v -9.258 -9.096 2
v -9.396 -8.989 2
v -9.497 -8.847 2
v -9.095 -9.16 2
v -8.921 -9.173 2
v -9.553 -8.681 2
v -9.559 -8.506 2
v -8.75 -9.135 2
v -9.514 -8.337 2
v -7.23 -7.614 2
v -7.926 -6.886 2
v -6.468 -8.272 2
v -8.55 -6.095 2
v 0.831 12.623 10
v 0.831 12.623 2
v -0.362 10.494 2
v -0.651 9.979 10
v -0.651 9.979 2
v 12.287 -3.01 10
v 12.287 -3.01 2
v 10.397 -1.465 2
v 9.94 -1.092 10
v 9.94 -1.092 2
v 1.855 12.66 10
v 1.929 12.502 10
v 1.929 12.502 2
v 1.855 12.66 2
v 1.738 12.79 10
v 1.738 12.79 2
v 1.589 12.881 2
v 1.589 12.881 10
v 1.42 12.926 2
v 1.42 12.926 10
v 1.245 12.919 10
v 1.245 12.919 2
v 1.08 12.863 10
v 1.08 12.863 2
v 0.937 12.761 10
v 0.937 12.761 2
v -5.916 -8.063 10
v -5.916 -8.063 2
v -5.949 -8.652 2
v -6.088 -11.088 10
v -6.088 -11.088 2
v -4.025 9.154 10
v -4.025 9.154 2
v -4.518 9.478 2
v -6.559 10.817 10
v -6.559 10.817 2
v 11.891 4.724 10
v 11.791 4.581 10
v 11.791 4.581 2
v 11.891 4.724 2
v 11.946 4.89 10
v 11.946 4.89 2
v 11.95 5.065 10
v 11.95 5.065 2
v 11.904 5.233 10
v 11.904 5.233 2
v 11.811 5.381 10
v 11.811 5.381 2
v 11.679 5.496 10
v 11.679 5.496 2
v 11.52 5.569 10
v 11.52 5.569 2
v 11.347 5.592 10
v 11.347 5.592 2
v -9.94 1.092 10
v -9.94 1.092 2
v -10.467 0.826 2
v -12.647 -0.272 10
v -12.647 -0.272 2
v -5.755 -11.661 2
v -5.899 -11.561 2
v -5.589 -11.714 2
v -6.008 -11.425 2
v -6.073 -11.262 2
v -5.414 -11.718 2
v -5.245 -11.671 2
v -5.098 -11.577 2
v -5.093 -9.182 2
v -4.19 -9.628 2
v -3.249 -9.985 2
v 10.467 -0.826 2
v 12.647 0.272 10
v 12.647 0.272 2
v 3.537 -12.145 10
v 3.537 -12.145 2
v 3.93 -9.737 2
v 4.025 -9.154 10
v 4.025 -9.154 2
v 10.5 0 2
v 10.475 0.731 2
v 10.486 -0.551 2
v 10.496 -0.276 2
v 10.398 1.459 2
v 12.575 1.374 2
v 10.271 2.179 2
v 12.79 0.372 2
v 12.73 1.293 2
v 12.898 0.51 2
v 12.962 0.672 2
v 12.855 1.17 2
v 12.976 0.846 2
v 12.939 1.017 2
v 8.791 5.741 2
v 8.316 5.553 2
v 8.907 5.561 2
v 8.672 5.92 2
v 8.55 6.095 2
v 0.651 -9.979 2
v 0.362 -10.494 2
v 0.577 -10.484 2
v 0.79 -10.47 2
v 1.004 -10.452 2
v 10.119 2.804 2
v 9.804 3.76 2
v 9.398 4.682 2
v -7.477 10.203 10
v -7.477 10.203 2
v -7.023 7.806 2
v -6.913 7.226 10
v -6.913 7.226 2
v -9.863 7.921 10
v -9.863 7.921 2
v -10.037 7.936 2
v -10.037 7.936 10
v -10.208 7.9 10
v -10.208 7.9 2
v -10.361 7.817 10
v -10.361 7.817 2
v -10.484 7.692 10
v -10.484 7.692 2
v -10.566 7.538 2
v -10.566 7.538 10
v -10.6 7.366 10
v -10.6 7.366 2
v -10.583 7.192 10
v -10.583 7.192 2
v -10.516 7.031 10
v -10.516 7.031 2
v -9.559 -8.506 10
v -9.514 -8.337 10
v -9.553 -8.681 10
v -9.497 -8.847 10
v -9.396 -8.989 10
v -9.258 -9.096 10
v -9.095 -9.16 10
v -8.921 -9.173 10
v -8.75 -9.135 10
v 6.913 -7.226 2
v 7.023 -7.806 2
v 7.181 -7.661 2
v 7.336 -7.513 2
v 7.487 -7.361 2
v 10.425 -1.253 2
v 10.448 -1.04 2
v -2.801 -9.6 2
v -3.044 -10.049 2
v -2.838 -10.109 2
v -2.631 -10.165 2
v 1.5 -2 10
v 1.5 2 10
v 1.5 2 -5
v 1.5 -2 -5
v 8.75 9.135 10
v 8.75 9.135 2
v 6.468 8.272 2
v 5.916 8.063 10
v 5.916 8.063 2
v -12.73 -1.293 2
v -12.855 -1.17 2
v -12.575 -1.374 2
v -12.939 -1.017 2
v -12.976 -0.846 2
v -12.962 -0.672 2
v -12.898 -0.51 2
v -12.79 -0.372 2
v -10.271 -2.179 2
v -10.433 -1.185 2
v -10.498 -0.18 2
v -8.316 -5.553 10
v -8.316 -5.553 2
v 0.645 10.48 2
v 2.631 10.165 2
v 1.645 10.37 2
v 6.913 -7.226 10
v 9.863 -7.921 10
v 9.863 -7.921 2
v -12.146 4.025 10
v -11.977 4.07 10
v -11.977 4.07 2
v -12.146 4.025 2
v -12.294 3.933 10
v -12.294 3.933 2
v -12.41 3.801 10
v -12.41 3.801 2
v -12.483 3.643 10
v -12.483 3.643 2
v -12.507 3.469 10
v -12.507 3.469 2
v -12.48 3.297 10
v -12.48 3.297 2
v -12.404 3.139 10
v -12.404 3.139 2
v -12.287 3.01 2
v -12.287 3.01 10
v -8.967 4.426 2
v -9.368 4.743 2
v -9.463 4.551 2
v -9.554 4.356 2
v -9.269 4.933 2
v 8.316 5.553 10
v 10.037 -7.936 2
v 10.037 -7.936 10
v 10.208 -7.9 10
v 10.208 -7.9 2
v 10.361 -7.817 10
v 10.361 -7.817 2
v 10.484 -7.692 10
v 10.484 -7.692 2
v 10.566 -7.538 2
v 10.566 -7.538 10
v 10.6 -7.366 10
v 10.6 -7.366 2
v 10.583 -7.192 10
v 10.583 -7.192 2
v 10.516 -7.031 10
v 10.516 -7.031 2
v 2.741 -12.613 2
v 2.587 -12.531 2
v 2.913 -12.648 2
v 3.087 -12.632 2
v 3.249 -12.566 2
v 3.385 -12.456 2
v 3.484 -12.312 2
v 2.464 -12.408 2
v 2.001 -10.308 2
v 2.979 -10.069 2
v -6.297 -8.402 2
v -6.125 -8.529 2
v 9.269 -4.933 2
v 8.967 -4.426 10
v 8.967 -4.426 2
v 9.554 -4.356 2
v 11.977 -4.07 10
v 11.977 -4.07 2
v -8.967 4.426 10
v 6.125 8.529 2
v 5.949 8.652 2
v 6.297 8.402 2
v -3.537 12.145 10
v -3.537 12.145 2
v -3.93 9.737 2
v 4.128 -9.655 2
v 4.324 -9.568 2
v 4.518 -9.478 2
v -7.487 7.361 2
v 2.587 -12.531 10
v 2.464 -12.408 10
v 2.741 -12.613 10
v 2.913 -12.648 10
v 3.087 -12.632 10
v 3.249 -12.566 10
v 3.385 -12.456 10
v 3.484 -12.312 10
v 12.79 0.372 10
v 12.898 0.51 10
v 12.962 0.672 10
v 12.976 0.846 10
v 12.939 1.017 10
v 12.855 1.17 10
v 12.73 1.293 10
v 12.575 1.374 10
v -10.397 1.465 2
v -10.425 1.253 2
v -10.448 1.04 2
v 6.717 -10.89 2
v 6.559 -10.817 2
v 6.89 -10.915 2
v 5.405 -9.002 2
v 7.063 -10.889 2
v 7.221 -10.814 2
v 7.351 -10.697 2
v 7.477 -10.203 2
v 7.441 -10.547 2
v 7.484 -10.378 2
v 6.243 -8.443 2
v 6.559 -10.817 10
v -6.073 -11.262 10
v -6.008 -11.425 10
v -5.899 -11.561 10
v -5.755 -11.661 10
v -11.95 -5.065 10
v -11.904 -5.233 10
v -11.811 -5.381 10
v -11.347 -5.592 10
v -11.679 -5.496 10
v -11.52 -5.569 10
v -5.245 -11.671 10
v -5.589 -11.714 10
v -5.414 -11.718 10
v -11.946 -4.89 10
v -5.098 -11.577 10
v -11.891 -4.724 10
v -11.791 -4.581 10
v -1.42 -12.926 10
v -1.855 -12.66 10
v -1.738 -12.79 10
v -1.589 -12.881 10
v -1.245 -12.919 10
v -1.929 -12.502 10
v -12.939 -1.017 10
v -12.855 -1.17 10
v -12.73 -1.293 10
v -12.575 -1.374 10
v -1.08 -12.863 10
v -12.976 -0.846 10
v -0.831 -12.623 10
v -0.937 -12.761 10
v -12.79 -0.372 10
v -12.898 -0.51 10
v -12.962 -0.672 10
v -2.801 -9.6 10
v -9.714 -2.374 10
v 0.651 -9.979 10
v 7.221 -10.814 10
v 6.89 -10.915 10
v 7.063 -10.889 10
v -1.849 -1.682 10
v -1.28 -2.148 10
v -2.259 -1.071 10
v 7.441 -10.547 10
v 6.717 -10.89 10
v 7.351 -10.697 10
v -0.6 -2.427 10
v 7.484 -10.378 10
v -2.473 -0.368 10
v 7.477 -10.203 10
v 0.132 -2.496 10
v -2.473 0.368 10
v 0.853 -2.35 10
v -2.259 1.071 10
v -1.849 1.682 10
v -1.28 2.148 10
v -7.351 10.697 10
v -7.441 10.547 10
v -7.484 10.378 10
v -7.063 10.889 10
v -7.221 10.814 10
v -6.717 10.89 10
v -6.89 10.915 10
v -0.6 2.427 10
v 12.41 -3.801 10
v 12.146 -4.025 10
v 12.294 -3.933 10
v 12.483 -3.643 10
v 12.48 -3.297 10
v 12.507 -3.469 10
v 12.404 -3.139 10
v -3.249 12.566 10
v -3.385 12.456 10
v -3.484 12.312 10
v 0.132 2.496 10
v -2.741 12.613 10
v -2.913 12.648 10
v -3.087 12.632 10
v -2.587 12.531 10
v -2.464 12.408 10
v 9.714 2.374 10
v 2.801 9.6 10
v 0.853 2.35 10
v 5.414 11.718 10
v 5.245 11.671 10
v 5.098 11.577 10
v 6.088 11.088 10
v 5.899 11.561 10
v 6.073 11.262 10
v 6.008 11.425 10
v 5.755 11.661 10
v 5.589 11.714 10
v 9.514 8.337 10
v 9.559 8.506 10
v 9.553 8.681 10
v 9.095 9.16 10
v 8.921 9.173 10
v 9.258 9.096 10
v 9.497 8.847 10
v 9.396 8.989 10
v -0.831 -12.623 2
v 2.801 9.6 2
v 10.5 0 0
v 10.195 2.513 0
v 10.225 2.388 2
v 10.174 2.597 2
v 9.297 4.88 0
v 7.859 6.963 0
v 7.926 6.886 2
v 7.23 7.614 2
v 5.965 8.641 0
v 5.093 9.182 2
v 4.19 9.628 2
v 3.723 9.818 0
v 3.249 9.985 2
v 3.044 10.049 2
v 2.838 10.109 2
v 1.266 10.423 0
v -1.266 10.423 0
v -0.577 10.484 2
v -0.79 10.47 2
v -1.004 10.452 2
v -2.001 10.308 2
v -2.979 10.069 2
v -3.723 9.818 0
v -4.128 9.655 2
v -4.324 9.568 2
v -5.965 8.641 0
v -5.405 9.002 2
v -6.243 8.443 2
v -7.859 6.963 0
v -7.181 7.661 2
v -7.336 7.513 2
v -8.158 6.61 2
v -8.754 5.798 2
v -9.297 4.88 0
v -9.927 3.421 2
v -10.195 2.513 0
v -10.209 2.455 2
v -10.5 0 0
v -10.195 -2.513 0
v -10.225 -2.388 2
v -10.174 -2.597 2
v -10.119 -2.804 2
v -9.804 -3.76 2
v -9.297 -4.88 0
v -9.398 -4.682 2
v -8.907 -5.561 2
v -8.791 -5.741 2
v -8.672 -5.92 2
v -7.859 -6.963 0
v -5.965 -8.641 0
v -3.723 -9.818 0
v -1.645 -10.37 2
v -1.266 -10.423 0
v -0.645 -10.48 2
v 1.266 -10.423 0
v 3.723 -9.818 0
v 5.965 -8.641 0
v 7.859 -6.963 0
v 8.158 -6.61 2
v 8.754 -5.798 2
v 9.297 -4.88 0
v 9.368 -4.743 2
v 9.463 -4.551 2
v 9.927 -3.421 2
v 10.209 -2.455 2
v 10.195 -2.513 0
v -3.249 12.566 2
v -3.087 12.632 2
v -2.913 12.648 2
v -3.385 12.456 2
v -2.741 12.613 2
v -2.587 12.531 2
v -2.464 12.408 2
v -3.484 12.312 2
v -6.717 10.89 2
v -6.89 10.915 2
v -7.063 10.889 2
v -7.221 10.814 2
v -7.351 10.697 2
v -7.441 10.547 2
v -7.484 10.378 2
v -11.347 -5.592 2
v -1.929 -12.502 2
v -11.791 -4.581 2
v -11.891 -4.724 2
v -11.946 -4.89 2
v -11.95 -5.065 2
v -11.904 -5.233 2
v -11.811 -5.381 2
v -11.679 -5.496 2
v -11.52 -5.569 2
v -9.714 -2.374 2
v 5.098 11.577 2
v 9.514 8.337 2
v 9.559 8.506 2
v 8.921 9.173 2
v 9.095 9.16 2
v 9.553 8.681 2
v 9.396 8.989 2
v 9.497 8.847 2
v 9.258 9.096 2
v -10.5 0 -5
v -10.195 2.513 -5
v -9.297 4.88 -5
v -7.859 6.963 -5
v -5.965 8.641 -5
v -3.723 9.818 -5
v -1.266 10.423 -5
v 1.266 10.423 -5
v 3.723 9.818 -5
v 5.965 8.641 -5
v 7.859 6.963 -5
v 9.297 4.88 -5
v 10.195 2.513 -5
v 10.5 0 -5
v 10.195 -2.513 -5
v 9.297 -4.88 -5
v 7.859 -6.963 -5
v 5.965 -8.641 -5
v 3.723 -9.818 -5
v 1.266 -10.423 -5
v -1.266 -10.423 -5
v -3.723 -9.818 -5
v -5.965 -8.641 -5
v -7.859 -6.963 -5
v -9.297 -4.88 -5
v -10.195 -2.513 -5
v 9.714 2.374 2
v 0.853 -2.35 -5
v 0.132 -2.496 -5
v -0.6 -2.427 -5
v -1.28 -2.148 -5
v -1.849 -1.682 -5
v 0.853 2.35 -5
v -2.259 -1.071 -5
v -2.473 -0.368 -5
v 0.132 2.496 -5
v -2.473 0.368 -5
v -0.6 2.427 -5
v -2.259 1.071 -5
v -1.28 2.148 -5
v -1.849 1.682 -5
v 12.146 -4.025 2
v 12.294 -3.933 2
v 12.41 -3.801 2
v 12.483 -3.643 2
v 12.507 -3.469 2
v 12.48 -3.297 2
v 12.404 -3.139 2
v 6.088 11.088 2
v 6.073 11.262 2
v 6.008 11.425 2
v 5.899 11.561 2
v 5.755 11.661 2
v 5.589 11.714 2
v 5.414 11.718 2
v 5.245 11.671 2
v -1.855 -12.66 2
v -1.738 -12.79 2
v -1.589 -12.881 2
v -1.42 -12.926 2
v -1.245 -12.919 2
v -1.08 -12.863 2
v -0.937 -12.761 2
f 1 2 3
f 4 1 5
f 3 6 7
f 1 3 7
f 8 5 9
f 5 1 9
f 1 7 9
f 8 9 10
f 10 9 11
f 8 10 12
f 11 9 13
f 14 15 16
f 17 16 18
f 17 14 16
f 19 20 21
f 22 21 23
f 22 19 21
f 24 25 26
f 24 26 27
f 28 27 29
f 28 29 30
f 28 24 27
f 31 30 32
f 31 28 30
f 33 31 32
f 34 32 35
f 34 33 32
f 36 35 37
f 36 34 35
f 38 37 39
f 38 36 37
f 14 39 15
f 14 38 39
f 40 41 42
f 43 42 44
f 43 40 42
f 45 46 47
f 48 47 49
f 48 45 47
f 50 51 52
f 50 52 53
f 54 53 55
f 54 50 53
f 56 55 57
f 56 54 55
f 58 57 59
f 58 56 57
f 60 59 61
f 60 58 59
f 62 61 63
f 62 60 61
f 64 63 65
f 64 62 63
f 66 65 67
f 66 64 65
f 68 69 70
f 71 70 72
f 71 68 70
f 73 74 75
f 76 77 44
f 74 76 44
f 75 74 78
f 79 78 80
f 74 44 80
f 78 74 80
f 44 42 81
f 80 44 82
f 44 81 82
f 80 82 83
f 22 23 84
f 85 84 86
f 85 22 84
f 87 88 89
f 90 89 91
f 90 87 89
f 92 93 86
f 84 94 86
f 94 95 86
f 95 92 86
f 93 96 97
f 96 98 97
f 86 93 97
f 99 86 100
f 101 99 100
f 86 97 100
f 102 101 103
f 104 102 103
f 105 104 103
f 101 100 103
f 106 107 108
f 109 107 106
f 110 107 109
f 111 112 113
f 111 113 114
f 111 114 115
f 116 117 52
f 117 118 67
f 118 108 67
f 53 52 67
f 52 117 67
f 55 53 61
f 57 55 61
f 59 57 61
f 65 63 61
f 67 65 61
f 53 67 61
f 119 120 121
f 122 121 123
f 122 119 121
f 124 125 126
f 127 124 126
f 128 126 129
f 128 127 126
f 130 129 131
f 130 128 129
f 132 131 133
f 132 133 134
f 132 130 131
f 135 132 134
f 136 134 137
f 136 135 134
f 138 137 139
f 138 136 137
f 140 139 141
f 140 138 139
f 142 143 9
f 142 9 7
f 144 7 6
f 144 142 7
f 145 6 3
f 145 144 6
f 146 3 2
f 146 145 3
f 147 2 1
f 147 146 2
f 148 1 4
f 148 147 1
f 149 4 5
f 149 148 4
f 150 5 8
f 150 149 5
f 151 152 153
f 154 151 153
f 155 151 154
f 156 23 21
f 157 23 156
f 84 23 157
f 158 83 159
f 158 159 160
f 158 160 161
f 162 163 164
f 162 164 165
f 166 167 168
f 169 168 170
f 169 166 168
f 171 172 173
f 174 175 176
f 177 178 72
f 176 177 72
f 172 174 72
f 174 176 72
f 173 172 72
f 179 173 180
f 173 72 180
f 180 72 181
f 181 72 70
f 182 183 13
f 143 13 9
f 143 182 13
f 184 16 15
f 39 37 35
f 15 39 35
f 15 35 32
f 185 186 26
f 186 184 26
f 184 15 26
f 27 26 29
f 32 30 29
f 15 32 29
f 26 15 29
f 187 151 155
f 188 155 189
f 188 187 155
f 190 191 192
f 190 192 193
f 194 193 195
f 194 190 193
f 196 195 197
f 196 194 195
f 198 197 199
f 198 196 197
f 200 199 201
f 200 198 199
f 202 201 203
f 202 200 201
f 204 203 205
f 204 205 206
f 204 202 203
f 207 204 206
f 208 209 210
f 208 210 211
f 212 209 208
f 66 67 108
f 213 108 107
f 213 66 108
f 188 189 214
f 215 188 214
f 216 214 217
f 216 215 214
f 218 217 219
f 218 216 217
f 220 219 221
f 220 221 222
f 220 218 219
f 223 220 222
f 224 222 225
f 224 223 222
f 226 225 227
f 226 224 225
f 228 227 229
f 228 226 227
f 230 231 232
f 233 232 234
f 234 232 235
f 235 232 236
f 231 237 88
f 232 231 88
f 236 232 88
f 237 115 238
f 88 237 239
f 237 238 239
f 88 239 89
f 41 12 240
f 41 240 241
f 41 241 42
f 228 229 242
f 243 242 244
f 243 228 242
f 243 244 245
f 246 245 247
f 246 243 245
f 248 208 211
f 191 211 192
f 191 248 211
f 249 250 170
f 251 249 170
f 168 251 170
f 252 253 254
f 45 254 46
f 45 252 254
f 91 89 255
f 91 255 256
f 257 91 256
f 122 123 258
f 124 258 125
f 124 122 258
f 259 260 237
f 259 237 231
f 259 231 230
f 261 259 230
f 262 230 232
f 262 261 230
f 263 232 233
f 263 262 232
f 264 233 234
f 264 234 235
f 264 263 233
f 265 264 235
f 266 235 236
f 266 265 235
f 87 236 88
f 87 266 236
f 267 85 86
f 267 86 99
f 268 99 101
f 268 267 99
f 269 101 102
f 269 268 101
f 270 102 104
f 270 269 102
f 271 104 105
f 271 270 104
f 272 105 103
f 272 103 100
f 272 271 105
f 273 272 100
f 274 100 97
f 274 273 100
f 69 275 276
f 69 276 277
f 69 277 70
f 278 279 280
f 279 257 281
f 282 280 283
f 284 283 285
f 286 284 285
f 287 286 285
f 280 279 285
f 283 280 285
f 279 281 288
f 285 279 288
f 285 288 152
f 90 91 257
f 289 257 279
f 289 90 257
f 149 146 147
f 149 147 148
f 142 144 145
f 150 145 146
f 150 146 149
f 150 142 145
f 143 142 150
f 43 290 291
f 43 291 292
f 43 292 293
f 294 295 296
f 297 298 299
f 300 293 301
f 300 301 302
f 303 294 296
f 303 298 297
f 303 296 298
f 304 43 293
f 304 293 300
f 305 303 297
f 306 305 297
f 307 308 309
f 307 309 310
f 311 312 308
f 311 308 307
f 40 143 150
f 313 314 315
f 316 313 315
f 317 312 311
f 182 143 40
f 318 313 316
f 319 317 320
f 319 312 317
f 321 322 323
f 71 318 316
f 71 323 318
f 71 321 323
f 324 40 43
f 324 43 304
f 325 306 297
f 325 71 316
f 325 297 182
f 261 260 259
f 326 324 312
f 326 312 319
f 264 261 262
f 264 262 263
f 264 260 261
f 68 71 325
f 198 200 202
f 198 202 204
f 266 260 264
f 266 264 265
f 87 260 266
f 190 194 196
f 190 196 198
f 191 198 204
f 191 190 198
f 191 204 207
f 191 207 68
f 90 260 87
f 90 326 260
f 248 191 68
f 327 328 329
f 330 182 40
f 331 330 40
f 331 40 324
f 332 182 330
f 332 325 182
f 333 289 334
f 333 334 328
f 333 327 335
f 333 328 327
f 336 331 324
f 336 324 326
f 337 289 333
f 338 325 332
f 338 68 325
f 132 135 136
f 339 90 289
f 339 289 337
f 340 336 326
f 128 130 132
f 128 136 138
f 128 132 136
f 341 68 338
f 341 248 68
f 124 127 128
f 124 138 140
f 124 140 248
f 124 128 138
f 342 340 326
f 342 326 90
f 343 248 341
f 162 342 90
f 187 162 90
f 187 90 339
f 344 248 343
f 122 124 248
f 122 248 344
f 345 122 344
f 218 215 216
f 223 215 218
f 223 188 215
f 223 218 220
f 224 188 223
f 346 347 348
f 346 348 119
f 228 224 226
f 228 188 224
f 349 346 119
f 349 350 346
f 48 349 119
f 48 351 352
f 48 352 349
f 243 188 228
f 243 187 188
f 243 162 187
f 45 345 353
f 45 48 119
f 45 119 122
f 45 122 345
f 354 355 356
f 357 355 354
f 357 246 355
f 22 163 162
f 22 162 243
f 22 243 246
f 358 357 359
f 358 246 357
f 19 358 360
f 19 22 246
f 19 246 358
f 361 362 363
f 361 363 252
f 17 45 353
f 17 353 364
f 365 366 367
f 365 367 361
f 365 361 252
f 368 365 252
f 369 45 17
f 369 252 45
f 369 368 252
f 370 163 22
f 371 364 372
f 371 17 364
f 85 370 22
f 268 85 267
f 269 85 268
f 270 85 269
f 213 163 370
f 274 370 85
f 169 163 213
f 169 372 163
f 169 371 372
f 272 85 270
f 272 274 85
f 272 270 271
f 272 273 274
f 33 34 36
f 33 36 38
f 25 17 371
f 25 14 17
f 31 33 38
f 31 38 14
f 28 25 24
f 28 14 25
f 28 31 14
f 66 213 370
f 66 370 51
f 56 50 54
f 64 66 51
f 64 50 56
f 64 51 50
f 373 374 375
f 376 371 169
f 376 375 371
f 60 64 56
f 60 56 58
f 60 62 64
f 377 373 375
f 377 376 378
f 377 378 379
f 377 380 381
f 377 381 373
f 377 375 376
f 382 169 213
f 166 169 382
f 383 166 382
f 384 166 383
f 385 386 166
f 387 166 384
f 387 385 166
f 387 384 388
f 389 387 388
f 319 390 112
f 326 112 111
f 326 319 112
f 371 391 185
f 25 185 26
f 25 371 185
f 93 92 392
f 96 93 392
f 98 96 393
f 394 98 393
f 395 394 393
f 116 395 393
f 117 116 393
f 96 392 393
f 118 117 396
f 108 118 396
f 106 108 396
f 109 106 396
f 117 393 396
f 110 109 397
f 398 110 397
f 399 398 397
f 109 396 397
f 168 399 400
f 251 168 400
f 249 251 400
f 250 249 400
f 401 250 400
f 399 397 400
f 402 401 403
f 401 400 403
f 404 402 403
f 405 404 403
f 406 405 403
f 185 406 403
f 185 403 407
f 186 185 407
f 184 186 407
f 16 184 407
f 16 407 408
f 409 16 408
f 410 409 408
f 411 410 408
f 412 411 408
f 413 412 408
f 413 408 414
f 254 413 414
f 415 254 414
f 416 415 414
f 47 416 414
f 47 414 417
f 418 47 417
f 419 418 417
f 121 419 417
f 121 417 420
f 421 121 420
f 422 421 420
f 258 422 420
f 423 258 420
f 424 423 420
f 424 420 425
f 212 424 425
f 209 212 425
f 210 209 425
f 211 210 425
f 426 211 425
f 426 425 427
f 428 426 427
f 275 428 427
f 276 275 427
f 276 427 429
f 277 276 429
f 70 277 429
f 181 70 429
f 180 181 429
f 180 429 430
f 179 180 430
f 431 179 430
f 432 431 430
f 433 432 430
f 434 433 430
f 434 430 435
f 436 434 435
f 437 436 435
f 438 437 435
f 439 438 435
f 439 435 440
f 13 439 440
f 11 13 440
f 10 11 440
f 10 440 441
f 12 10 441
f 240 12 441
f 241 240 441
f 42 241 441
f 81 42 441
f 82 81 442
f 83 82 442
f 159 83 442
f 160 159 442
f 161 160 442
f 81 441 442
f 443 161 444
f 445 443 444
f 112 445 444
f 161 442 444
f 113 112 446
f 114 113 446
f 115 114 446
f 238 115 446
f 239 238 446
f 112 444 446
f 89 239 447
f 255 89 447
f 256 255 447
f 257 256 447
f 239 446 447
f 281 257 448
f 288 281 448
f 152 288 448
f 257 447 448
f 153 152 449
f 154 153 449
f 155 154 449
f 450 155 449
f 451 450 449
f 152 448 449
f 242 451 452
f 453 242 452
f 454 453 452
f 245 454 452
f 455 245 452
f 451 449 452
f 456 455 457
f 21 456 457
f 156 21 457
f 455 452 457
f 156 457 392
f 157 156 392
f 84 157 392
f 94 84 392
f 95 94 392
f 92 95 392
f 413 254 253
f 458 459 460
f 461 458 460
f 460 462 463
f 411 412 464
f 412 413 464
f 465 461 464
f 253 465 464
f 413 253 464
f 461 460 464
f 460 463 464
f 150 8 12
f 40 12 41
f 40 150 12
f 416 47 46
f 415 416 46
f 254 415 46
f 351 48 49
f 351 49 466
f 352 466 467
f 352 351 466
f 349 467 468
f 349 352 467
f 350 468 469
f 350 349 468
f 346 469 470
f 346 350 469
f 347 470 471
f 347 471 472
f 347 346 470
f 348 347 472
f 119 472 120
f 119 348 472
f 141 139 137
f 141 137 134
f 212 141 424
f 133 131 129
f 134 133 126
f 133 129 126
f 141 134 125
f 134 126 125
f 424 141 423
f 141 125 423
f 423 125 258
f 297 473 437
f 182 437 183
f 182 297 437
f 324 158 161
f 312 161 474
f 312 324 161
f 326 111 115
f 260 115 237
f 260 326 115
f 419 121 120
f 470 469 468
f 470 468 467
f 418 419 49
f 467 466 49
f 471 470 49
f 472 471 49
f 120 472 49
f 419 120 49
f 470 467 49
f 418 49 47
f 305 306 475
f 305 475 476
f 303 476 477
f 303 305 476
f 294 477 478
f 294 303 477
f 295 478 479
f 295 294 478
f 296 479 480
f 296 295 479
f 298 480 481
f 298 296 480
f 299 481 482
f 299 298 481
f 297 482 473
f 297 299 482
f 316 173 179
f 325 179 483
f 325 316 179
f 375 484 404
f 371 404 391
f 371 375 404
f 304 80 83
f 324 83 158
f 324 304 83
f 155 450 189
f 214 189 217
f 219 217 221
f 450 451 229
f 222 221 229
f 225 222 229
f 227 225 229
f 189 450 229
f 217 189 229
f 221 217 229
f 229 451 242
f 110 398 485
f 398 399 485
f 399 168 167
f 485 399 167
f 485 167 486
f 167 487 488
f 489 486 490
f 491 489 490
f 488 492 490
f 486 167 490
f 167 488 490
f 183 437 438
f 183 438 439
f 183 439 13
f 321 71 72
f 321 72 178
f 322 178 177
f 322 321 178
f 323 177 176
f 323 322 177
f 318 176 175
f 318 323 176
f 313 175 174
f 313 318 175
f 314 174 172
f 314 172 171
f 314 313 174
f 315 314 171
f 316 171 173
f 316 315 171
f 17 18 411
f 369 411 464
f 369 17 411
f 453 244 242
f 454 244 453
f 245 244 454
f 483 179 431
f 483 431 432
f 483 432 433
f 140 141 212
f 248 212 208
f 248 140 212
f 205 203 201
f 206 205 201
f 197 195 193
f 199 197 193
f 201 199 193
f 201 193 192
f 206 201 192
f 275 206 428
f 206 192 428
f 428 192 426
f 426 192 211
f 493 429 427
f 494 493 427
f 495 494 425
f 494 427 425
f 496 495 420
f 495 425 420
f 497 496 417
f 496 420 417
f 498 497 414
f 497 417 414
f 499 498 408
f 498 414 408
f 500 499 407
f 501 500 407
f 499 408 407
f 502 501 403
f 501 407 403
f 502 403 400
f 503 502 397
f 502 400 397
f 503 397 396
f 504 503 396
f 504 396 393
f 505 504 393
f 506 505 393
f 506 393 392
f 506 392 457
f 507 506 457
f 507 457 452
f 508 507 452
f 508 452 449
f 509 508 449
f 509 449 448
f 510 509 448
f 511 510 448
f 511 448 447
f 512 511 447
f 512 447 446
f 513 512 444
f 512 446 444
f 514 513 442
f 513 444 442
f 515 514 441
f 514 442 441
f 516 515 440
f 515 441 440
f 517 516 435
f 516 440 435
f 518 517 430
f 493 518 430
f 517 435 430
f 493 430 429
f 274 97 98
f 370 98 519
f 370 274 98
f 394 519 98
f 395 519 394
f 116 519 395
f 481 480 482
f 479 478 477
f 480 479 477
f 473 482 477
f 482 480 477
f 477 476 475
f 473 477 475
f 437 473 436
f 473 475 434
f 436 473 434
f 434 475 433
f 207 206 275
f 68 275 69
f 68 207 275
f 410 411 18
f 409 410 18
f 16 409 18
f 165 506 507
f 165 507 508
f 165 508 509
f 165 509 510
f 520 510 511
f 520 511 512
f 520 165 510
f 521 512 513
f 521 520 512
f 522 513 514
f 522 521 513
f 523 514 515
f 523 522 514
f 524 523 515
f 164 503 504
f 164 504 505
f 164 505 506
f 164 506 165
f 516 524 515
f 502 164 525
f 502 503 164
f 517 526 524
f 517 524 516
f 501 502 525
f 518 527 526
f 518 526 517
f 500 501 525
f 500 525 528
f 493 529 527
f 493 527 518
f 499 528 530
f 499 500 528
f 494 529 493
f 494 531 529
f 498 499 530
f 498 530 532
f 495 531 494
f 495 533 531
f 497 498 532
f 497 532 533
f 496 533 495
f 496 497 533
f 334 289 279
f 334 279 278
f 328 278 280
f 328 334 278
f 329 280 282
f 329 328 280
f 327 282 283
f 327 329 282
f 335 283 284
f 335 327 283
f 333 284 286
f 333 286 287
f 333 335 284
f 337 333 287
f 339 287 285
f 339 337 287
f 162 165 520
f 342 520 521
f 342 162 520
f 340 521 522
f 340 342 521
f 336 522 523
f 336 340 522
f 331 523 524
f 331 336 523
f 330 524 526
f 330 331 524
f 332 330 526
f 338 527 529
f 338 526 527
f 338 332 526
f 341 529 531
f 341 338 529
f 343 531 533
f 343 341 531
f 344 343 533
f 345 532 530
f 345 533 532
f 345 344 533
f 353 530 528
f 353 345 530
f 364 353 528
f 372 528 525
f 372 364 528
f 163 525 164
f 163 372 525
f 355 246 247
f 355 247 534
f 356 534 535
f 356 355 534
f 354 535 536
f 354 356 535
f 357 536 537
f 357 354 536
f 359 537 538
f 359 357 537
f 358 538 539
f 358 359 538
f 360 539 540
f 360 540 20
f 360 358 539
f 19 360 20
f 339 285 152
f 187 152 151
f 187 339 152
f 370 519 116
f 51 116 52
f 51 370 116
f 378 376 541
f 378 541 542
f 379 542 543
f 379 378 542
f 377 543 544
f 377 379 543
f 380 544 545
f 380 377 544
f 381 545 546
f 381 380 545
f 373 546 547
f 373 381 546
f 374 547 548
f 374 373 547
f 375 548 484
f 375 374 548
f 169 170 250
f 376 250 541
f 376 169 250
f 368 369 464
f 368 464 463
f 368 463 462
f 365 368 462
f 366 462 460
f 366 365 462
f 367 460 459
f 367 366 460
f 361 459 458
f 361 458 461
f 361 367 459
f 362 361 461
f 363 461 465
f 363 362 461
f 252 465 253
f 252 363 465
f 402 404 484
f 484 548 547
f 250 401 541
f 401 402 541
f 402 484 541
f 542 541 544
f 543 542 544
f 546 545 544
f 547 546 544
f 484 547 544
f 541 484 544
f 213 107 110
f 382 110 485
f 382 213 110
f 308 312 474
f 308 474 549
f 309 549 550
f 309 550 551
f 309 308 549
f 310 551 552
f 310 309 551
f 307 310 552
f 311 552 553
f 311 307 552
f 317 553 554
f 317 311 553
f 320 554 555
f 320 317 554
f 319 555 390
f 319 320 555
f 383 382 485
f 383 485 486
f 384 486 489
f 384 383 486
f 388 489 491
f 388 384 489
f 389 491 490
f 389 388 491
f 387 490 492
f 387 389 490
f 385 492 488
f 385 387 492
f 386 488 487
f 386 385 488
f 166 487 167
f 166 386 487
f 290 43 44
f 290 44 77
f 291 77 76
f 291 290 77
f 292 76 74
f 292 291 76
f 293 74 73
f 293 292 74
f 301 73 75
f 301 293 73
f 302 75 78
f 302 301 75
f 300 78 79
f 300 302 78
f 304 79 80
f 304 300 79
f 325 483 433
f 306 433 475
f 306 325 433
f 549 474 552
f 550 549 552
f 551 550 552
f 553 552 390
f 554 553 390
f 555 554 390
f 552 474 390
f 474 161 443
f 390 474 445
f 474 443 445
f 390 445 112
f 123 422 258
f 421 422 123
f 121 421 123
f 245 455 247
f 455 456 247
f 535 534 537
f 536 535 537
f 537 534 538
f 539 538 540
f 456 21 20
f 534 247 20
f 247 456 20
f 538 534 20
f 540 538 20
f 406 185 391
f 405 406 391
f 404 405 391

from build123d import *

# Parameters (mm, degrees)
SKETCH1_R                 = 7.5
BOSS_EXTRUDE1_DEPTH       = 10
SKETCH3_R                 = 10.5
BOSS_EXTRUDE2_DEPTH       = 5
CUT_EXTRUDE1_REACH        = 23.107
BOSS_EXTRUDE3_START       = -8
SKETCH4_R                 = 14.5
SKETCH4_R_2               = 7.5
BOSS_EXTRUDE3_DEPTH       = 8
BOSS_EXTRUDE4_OUTLINE_R   = 10.5
BOSS_EXTRUDE4_OUTLINE_R_2 = 7.5
BOSS_EXTRUDE4_DEPTH       = 2
SKETCH6_R                 = 14.465552515
CUT_EXTRUDE2_DEPTH        = 8


# Read off the part's stored shape, not the designer's step: Boss-Extrude4
with BuildPart() as part:
    # Sketch1 → Boss-Extrude1 (new body)
    with BuildSketch(Plane.XY):
        Circle(SKETCH1_R)
    extrude(amount=BOSS_EXTRUDE1_DEPTH)

    # Sketch3 → Boss-Extrude2 (add)
    with BuildSketch(Plane(origin=(0, 0, 0), x_dir=(-1, 0, 0), z_dir=(0, 0, -1))):
        Circle(SKETCH3_R)
    extrude(amount=BOSS_EXTRUDE2_DEPTH)

    # Sketch2 → Cut-Extrude1 (cut, up to next)
    with BuildSketch(Plane.XY.offset(10), mode=Mode.PRIVATE) as cut_extrude1_sk1:
        with BuildLine():
            Line((1.5, 2), (1.5, -2))
            ThreePointArc((1.5, -2), (-2.5, 0), (1.5, 2))
        make_face()
    cut_extrude1_tool1 = extrude(cut_extrude1_sk1.sketch, amount=-CUT_EXTRUDE1_REACH, mode=Mode.PRIVATE) & part.part
    add(cut_extrude1_tool1.solids().sort_by_distance((-0.316718, 0, 10))[0], mode=Mode.SUBTRACT)

    # Sketch4 → Boss-Extrude3 (add)
    with BuildSketch(Plane.XY.offset(10).offset(BOSS_EXTRUDE3_START)):
        Circle(SKETCH4_R)
        with Locations(Location((0, 0, 0), (0, 0, 180))):
            Circle(SKETCH4_R_2, mode=Mode.SUBTRACT)
    extrude(amount=BOSS_EXTRUDE3_DEPTH)

    # Boss-Extrude4 outline → Boss-Extrude4 (add)
    with BuildSketch(Plane.XY):
        Circle(BOSS_EXTRUDE4_OUTLINE_R)
        Circle(BOSS_EXTRUDE4_OUTLINE_R_2, mode=Mode.SUBTRACT)
    extrude(amount=BOSS_EXTRUDE4_DEPTH)

    # Sketch6 → Cut-Extrude2 (cut)
    with BuildSketch(Plane.XY.offset(10)):
        Circle(SKETCH6_R)
        with BuildLine():
            Line((5.915587052, 8.062619291), (6.088339002, 11.088366247))
            ThreePointArc((6.088339002, 11.088366247), (5.754853945, 11.660608595), (5.097799094, 11.57722688))
            Line((5.097799094, 11.57722688), (2.801255295, 9.599633783))
            Line((2.801255295, 9.599633783), (1.92872262, 12.501990517))
            ThreePointArc((1.92872262, 12.501990517), (1.419630763, 12.925663822), (0.830719394, 12.622584645))
            Line((0.830719394, 12.622584645), (-0.650949193, 9.978790766))
            Line((-0.650949193, 9.978790766), (-2.463526175, 12.407690221))
            ThreePointArc((-2.463526175, 12.407690221), (-3.086820841, 12.631693229), (-3.536557325, 12.145472413))
            Line((-3.536557325, 12.145472413), (-4.024639601, 9.154358311))
            Line((-4.024639601, 9.154358311), (-6.558637356, 10.816839366))
            ThreePointArc((-6.558637356, 10.816839366), (-7.220956294, 10.814154009), (-7.477273036, 10.203436959))
            Line((-7.477273036, 10.203436959), (-6.912899076, 7.225775139))
            Line((-6.912899076, 7.225775139), (-9.862680076, 7.921318044))
            ThreePointArc((-9.862680076, 7.921318044), (-10.484137849, 7.692268216), (-10.516119267, 7.030716422))
            Line((-10.516119267, 7.030716422), (-8.967360899, 4.425656845))
            Line((-8.967360899, 4.425656845), (-11.977138021, 4.07036886))
            ThreePointArc((-11.977138021, 4.07036886), (-12.48277765, 3.64258135), (-12.286566313, 3.009987721))
            Line((-12.286566313, 3.009987721), (-9.940226653, 1.09173902))
            Line((-9.940226653, 1.09173902), (-12.646976358, -0.271526881))
            ThreePointArc((-12.646976358, -0.271526881), (-12.97581024, -0.846454586), (-12.575072131, -1.373789921))
            Line((-12.575072131, -1.373789921), (-9.714154371, -2.373858644))
            Line((-9.714154371, -2.373858644), (-11.791402696, -4.580672473))
            ThreePointArc((-11.791402696, -4.580672473), (-11.903768612, -5.233395606), (-11.346838661, -5.591868224))
            Line((-11.346838661, -5.591868224), (-8.316411706, -5.553133921))
            Line((-8.316411706, -5.553133921), (-9.513611846, -8.337321361))
            ThreePointArc((-9.513611846, -8.337321361), (-9.395956809, -8.98911188), (-8.750008988, -9.135484692))
            Line((-8.750008988, -9.135484692), (-5.915587052, -8.062619291))
            Line((-5.915587052, -8.062619291), (-6.088339002, -11.088366247))
            ThreePointArc((-6.088339002, -11.088366247), (-5.754853945, -11.660608595), (-5.097799094, -11.57722688))
            Line((-5.097799094, -11.57722688), (-2.801255295, -9.599633783))
            Line((-2.801255295, -9.599633783), (-1.92872262, -12.501990517))
            ThreePointArc((-1.92872262, -12.501990517), (-1.419630763, -12.925663822), (-0.830719394, -12.622584645))
            Line((-0.830719394, -12.622584645), (0.650949193, -9.978790766))
            Line((0.650949193, -9.978790766), (2.463526175, -12.407690221))
            ThreePointArc((2.463526175, -12.407690221), (3.086820841, -12.631693229), (3.536557325, -12.145472413))
            Line((3.536557325, -12.145472413), (4.024639601, -9.154358311))
            Line((4.024639601, -9.154358311), (6.558637356, -10.816839366))
            ThreePointArc((6.558637356, -10.816839366), (7.220956294, -10.814154009), (7.477273036, -10.203436959))
            Line((7.477273036, -10.203436959), (6.912899076, -7.225775139))
            Line((6.912899076, -7.225775139), (9.862680076, -7.921318044))
            ThreePointArc((9.862680076, -7.921318044), (10.484137849, -7.692268216), (10.516119267, -7.030716422))
            Line((10.516119267, -7.030716422), (8.967360899, -4.425656845))
            Line((8.967360899, -4.425656845), (11.977138021, -4.07036886))
            ThreePointArc((11.977138021, -4.07036886), (12.48277765, -3.64258135), (12.286566313, -3.009987721))
            Line((12.286566313, -3.009987721), (9.940226653, -1.09173902))
            Line((9.940226653, -1.09173902), (12.646976358, 0.271526881))
            ThreePointArc((12.646976358, 0.271526881), (12.97581024, 0.846454586), (12.575072131, 1.373789921))
            Line((12.575072131, 1.373789921), (9.714154371, 2.373858644))
            Line((9.714154371, 2.373858644), (11.791402696, 4.580672473))
            ThreePointArc((11.791402696, 4.580672473), (11.903768612, 5.233395606), (11.346838661, 5.591868224))
            Line((11.346838661, 5.591868224), (8.316411706, 5.553133921))
            Line((8.316411706, 5.553133921), (9.513611846, 8.337321361))
            ThreePointArc((9.513611846, 8.337321361), (9.395956809, 8.98911188), (8.750008988, 9.135484692))
            Line((8.750008988, 9.135484692), (5.915587052, 8.062619291))
        make_face(mode=Mode.SUBTRACT)
    extrude(amount=-CUT_EXTRUDE2_DEPTH, mode=Mode.SUBTRACT)


with BuildPart() as body_2:
    # of the pieces the cut leaves, the one that is kept (cut_extrude2_keep)
    add(part.part.solids().sort_by_distance((-10.5, 0, 0))[0])


solid = body_2.part
